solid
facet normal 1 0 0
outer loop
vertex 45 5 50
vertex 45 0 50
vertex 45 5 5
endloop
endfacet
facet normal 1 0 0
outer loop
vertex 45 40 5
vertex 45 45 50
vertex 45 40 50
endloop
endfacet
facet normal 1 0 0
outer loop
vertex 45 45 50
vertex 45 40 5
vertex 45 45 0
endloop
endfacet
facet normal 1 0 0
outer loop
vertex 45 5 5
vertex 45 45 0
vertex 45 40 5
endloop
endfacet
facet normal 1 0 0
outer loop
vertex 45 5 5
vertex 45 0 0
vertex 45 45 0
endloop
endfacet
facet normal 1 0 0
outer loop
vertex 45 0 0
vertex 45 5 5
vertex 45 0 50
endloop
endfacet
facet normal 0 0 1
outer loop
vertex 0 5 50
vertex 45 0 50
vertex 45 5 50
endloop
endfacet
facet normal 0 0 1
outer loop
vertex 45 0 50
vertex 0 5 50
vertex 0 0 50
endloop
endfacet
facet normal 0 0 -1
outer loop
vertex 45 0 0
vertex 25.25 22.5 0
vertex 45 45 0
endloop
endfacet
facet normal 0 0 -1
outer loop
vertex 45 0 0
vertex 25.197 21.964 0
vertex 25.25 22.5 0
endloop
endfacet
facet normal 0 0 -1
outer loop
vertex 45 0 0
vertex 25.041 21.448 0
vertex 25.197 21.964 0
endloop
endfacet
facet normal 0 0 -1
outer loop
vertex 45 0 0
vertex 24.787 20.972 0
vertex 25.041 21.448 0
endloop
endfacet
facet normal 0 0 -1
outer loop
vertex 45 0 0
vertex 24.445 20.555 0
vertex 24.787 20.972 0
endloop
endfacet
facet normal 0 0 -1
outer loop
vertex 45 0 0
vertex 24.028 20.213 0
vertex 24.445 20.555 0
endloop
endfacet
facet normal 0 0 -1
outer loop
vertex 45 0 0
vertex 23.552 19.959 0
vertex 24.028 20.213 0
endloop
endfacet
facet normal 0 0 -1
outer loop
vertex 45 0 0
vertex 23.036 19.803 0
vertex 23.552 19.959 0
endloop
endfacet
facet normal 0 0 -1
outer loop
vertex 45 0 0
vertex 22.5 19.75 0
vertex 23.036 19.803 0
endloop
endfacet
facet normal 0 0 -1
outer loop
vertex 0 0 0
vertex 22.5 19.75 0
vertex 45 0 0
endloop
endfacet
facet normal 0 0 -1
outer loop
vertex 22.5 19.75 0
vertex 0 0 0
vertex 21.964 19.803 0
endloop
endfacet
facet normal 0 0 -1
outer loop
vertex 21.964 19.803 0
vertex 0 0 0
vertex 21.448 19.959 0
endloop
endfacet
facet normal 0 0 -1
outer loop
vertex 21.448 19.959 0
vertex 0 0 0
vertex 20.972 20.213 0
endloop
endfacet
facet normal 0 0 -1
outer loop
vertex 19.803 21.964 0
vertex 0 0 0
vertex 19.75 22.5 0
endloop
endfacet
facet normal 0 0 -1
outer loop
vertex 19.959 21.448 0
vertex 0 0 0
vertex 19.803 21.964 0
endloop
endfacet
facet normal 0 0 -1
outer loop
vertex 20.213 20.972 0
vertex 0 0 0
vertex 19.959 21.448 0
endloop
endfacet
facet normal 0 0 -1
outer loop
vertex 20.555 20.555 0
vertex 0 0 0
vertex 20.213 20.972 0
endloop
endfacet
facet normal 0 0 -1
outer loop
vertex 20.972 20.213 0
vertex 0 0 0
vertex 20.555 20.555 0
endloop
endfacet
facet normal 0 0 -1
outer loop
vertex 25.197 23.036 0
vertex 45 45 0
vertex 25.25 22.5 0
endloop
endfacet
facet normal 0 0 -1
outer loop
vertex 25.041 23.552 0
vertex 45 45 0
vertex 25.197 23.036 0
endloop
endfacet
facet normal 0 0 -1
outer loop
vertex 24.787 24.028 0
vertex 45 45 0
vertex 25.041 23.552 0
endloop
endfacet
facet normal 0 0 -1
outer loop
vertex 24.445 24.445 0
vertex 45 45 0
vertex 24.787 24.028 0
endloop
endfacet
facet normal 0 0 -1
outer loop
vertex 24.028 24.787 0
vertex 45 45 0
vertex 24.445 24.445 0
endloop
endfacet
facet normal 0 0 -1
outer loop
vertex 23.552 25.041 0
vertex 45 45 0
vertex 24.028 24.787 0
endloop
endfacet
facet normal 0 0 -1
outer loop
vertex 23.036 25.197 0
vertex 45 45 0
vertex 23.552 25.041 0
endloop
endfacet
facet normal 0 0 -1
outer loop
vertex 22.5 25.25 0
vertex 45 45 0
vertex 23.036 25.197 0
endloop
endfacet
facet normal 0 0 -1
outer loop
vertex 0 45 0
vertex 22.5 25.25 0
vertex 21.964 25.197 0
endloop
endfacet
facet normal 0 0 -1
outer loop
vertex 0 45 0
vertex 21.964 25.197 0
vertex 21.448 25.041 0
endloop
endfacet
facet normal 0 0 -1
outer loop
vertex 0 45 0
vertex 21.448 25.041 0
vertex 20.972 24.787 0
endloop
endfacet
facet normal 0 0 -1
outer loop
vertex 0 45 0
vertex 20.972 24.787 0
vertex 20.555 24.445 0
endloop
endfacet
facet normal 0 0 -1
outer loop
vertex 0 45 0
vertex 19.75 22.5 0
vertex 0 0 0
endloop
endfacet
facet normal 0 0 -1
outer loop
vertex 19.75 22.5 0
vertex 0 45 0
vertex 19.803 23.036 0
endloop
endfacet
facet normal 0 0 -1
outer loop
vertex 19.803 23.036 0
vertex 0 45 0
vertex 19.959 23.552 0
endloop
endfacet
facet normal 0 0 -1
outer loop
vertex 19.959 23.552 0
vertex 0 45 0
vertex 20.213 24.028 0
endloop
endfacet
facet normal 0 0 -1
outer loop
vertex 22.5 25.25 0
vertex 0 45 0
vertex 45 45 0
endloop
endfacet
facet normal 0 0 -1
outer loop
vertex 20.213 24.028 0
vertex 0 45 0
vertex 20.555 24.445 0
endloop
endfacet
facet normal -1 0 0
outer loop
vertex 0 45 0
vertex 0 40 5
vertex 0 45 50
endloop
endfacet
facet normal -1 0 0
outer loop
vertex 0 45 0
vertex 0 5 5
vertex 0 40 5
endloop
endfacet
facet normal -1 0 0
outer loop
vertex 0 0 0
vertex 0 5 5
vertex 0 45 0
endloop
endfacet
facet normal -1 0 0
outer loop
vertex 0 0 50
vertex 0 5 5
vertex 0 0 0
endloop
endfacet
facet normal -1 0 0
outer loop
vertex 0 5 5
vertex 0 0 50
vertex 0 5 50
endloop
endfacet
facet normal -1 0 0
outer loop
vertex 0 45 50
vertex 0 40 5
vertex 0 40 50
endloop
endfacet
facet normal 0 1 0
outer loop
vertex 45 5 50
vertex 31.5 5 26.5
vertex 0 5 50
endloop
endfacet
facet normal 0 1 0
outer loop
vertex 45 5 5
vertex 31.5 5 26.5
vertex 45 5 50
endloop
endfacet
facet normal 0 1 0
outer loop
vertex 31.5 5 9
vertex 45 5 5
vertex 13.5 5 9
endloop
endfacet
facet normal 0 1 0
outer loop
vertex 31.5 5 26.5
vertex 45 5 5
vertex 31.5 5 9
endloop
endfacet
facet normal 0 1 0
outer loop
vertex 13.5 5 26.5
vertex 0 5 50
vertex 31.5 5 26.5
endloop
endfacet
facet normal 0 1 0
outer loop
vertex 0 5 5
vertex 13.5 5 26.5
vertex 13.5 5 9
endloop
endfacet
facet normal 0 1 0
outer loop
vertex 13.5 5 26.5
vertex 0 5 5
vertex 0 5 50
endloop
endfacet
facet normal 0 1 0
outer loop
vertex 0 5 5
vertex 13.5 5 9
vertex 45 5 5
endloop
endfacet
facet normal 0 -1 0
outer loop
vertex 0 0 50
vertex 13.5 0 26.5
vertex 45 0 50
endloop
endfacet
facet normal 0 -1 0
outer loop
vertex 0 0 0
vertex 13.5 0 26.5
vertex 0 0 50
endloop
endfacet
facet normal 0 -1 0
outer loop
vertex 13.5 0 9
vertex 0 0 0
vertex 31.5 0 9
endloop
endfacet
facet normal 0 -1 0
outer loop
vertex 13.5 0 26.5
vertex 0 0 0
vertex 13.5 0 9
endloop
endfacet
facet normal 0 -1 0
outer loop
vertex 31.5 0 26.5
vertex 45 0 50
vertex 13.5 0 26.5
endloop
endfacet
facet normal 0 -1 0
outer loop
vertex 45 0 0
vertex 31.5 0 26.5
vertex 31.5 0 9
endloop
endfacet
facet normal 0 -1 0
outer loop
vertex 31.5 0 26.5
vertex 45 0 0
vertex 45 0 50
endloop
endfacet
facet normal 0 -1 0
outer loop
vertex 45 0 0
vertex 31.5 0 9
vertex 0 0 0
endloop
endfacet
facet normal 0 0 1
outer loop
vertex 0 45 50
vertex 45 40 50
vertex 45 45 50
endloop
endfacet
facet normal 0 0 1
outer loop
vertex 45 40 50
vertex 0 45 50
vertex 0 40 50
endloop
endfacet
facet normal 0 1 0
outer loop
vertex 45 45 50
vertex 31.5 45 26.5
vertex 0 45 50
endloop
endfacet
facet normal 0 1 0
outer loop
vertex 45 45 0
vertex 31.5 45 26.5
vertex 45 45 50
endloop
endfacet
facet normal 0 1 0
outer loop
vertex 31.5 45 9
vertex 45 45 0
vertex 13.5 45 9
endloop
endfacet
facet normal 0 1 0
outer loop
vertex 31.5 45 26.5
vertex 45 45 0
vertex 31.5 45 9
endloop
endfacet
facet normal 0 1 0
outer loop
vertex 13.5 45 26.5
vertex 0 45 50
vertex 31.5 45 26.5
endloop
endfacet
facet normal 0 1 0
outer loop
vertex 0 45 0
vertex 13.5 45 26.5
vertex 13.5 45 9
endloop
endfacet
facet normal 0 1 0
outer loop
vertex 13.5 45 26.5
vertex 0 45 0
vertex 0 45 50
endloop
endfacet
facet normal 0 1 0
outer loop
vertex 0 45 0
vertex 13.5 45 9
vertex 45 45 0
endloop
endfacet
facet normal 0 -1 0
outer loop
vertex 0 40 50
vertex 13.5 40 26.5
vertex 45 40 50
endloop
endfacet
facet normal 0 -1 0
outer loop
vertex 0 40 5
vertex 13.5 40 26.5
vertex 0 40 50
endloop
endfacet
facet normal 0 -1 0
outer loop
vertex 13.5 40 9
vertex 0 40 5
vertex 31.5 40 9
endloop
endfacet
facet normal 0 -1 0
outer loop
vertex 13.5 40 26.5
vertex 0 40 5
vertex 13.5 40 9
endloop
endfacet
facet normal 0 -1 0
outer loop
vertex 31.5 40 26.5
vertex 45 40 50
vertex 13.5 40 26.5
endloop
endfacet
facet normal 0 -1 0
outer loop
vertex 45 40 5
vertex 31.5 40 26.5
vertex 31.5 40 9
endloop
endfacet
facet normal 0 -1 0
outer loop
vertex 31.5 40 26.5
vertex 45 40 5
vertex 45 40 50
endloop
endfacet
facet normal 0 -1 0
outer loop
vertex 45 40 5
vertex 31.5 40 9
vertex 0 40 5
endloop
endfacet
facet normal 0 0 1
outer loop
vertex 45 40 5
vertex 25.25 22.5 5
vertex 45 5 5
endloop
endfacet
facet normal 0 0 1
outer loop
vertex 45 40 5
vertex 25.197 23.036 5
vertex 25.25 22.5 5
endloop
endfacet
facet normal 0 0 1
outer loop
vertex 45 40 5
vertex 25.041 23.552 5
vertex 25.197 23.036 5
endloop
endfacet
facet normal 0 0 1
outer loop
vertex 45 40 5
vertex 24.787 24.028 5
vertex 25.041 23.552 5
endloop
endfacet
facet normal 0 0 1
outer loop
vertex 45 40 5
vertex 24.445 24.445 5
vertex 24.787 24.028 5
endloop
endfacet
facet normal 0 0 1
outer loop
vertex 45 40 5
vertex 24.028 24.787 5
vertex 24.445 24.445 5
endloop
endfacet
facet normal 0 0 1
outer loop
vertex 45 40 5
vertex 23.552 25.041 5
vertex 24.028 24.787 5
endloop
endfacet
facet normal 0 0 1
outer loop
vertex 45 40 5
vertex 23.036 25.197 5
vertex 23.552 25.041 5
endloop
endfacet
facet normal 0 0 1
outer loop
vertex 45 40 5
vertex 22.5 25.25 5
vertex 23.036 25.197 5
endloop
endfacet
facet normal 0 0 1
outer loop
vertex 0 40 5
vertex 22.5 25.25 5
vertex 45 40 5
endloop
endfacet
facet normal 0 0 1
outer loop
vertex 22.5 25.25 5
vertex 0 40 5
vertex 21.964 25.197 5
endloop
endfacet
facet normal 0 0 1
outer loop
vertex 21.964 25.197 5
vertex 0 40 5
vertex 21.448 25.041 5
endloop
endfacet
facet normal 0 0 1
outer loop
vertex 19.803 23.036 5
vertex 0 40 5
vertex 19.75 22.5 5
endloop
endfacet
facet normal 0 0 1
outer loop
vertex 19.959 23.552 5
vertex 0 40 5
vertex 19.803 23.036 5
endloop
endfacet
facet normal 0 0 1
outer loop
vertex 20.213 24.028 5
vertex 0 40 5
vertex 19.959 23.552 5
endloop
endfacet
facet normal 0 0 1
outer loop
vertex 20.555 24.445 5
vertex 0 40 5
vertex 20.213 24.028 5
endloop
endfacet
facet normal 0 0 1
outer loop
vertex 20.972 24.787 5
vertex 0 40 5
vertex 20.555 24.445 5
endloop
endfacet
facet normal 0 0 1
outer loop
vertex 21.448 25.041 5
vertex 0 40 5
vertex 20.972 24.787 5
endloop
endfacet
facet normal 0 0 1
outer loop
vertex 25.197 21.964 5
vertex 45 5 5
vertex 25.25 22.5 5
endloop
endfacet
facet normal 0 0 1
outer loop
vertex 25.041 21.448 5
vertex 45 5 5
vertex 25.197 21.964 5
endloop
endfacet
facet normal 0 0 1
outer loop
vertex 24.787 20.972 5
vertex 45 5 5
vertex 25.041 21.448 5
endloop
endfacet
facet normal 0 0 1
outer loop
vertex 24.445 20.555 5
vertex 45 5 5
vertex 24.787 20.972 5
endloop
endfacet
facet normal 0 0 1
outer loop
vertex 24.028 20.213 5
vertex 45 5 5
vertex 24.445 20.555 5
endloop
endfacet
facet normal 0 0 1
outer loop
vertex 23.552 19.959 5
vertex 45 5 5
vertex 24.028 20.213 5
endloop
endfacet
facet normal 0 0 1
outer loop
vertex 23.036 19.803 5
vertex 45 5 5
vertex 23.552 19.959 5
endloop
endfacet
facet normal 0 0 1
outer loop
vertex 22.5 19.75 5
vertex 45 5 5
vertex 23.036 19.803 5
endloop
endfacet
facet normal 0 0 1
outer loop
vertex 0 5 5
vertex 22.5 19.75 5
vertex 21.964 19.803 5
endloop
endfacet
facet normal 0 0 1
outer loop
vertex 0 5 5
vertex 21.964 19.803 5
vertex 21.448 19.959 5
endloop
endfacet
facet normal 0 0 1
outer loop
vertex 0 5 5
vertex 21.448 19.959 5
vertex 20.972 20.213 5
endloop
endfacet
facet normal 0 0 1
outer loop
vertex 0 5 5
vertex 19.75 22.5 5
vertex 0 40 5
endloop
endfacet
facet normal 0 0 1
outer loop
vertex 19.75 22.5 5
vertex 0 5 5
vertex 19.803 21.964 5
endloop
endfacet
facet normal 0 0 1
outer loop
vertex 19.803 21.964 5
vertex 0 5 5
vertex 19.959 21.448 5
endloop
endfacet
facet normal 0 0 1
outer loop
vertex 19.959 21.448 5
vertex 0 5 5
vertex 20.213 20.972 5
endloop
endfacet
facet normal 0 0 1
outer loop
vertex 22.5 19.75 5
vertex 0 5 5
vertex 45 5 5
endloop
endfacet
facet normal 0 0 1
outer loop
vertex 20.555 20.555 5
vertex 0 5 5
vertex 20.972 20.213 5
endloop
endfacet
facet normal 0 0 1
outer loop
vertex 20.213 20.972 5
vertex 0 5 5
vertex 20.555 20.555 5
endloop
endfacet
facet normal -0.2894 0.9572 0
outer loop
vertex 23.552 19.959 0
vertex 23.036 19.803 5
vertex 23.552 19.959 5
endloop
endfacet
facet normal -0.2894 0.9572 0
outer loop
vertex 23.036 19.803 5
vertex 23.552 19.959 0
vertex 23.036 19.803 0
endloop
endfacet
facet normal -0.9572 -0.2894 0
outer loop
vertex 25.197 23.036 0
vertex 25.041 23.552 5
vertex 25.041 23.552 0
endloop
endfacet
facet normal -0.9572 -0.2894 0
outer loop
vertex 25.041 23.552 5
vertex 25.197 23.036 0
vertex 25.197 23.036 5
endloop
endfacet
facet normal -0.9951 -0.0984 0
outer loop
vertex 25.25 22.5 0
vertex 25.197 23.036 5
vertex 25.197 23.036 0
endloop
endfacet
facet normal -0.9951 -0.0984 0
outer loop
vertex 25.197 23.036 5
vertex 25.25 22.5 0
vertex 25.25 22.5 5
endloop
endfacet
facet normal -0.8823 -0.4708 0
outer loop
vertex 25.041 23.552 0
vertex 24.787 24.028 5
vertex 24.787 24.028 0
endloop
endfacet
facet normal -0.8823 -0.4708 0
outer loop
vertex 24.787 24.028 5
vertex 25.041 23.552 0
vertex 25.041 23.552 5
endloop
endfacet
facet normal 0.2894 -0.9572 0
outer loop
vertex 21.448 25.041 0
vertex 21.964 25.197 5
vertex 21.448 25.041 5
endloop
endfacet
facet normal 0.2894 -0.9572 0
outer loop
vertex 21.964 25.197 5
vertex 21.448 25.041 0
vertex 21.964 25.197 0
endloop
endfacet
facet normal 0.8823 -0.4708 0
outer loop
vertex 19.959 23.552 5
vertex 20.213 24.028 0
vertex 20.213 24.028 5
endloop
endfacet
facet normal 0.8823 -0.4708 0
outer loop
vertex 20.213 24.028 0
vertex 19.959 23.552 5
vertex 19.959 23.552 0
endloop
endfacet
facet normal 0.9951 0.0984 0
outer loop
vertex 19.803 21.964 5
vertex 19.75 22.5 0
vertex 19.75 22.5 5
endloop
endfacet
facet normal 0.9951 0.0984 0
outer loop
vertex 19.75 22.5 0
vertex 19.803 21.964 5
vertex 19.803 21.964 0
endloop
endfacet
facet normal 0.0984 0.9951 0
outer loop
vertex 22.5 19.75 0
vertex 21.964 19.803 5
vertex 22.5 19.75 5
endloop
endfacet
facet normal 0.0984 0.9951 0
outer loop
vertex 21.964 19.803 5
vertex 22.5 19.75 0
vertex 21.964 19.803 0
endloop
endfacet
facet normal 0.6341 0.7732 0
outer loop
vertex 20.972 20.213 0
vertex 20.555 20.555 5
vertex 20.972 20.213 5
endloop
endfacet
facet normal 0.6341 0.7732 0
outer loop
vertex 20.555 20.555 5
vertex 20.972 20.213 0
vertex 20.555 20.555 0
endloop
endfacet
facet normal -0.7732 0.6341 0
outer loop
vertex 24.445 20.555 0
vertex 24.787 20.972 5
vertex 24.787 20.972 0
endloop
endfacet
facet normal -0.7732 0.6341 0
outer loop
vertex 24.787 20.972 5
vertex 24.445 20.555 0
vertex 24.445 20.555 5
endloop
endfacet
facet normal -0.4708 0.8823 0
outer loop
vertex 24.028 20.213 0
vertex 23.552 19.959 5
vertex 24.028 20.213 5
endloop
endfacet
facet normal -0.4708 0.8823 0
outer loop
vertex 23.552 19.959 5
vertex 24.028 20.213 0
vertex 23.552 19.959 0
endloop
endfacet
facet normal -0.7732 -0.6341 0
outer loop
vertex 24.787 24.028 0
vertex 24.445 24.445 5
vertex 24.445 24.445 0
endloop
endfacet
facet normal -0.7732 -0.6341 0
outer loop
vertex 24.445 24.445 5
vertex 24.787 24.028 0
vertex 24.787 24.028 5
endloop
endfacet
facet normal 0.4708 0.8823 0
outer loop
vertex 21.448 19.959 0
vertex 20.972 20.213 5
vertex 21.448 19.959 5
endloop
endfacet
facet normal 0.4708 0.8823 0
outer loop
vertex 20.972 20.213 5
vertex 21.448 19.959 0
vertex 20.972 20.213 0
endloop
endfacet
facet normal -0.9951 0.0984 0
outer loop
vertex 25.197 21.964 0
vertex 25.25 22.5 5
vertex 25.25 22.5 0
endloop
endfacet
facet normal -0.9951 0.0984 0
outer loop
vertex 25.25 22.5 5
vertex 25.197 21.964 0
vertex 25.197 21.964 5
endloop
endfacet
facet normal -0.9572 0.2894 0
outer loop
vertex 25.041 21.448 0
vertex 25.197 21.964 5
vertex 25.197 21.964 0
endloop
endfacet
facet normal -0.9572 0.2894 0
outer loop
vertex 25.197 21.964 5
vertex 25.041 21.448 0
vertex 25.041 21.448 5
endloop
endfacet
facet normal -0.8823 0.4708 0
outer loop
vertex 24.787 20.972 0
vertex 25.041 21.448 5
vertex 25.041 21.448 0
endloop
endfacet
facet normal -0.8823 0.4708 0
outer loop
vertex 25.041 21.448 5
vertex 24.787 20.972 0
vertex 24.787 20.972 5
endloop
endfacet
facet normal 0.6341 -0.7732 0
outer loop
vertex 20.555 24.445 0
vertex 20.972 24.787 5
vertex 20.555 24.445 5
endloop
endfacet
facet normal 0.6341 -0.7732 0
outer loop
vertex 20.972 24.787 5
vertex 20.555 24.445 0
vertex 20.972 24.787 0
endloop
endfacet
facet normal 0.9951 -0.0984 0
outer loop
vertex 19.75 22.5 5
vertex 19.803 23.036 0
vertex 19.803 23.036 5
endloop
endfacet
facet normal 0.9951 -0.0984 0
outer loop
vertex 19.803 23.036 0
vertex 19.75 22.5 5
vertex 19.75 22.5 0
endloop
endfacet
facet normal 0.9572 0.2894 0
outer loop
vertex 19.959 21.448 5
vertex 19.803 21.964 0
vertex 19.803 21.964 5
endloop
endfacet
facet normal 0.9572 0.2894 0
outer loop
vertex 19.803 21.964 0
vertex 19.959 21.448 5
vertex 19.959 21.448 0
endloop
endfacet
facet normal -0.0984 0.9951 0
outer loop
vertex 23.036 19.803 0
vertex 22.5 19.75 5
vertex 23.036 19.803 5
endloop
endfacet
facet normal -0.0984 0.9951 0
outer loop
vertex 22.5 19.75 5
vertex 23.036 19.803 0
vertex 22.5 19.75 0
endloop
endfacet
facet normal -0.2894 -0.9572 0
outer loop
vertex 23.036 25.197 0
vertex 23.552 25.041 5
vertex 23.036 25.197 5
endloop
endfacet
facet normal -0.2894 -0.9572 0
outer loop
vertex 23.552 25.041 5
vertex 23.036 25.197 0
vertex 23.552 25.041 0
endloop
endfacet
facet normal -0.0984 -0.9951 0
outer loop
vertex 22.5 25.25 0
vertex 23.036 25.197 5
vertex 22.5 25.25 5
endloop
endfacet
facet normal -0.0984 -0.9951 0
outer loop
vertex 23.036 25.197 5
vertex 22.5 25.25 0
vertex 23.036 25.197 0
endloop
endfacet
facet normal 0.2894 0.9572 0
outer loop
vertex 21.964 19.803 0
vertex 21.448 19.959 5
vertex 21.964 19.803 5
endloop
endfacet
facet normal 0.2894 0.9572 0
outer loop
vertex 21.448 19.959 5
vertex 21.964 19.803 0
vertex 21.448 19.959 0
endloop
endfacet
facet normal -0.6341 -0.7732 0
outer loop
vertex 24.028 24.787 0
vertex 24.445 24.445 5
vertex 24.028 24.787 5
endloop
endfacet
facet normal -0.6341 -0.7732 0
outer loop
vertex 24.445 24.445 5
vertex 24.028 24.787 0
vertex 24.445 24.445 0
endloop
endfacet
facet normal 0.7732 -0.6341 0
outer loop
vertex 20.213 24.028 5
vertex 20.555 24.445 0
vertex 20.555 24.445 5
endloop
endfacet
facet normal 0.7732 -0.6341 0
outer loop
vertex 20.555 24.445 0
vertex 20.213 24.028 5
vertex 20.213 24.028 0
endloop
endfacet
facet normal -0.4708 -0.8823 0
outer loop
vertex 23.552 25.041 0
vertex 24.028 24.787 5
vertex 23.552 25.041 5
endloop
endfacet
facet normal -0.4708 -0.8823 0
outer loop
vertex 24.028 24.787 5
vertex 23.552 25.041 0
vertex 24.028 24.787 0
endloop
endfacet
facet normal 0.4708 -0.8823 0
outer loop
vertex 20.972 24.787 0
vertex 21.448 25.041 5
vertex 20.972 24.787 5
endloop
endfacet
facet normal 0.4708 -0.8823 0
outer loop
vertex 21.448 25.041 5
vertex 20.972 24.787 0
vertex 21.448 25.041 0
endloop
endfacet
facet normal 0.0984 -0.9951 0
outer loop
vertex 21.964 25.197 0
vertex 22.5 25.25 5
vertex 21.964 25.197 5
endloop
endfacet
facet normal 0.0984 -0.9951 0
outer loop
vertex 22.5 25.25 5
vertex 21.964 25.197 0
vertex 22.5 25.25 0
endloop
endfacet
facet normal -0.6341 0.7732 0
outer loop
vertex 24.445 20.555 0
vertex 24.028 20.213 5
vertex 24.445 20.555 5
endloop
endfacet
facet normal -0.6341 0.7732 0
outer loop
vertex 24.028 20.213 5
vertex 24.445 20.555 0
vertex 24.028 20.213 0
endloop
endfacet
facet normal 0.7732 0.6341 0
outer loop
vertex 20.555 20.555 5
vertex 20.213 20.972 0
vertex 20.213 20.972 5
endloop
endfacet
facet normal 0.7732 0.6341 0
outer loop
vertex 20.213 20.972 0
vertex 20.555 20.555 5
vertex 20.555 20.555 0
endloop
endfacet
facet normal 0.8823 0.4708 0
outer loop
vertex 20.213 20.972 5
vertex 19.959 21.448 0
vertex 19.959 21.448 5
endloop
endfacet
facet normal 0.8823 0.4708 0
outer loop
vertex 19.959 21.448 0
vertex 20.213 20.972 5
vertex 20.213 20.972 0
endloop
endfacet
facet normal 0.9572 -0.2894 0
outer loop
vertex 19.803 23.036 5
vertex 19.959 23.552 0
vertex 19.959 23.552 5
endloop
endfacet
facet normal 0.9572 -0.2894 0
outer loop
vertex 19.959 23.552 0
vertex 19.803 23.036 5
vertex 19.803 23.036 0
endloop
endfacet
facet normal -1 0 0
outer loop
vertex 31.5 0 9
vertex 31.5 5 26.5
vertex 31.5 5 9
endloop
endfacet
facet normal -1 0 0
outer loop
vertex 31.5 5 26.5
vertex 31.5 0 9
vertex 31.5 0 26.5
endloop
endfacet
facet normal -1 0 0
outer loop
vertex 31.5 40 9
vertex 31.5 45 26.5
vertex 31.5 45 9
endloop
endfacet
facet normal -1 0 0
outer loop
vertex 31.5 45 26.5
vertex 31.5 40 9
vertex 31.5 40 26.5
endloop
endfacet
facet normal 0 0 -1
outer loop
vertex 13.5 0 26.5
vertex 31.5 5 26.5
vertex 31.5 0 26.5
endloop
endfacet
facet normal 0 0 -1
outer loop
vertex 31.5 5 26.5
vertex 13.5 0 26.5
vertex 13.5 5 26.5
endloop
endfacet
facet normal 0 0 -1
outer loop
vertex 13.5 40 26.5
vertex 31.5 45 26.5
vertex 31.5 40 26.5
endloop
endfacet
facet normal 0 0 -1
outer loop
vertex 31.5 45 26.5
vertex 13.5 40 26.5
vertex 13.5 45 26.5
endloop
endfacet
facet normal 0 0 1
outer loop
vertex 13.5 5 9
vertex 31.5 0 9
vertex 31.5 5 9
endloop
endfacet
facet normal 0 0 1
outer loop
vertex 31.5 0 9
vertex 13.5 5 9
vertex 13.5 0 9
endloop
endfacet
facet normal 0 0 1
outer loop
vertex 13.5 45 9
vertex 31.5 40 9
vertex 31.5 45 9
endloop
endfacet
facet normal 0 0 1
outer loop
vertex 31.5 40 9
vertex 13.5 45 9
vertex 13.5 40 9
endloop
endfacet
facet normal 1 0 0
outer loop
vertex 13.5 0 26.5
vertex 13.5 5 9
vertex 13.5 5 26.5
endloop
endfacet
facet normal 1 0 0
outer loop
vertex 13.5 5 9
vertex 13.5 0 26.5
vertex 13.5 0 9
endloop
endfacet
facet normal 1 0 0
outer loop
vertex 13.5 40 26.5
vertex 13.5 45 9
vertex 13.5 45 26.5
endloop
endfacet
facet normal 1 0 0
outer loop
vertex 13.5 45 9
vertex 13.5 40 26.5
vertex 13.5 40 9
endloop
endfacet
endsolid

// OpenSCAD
$fn = 32;

// ----------------------------------------------------------------------
// U-bracket: 45 x 45 x 50 mm
// ----------------------------------------------------------------------

// --- parameters (mm) ---
base_len = 45;            // outer length, X
channel_w = 45;           // outer width, Y
upright_h = 50;           // upright height, Z
mat_t = 5;                // wall thickness
hole_d = 5.5;             // clearance for M5
window_l = 18;            // window length
window_h = 17.5;          // window height

module hole_z(px, py) {
  translate([px, py, -0.5]) cylinder(h = mat_t + 1, d = hole_d);
}
module hole_y_pz(pz) {
  /* through both uprights along Y */
  translate([0, -0.5, pz]) rotate([-90, 0, 0]) cylinder(h = channel_w + 1, d = hole_d);
}

module base() {
  cube([base_len, channel_w, mat_t]);
}

module uprights() {
  cube([base_len, mat_t, upright_h]);
  translate([0, channel_w - mat_t, 0]) cube([base_len, mat_t, upright_h]);
}

difference() {
  union() {
    base();
    uprights();
  }
  hole_z(22.5, 22.5);
  /* lightening window through both uprights */
  translate([base_len / 2 - window_l / 2, -1, mat_t + 4])
    cube([window_l, channel_w + 2, window_h]);
}
